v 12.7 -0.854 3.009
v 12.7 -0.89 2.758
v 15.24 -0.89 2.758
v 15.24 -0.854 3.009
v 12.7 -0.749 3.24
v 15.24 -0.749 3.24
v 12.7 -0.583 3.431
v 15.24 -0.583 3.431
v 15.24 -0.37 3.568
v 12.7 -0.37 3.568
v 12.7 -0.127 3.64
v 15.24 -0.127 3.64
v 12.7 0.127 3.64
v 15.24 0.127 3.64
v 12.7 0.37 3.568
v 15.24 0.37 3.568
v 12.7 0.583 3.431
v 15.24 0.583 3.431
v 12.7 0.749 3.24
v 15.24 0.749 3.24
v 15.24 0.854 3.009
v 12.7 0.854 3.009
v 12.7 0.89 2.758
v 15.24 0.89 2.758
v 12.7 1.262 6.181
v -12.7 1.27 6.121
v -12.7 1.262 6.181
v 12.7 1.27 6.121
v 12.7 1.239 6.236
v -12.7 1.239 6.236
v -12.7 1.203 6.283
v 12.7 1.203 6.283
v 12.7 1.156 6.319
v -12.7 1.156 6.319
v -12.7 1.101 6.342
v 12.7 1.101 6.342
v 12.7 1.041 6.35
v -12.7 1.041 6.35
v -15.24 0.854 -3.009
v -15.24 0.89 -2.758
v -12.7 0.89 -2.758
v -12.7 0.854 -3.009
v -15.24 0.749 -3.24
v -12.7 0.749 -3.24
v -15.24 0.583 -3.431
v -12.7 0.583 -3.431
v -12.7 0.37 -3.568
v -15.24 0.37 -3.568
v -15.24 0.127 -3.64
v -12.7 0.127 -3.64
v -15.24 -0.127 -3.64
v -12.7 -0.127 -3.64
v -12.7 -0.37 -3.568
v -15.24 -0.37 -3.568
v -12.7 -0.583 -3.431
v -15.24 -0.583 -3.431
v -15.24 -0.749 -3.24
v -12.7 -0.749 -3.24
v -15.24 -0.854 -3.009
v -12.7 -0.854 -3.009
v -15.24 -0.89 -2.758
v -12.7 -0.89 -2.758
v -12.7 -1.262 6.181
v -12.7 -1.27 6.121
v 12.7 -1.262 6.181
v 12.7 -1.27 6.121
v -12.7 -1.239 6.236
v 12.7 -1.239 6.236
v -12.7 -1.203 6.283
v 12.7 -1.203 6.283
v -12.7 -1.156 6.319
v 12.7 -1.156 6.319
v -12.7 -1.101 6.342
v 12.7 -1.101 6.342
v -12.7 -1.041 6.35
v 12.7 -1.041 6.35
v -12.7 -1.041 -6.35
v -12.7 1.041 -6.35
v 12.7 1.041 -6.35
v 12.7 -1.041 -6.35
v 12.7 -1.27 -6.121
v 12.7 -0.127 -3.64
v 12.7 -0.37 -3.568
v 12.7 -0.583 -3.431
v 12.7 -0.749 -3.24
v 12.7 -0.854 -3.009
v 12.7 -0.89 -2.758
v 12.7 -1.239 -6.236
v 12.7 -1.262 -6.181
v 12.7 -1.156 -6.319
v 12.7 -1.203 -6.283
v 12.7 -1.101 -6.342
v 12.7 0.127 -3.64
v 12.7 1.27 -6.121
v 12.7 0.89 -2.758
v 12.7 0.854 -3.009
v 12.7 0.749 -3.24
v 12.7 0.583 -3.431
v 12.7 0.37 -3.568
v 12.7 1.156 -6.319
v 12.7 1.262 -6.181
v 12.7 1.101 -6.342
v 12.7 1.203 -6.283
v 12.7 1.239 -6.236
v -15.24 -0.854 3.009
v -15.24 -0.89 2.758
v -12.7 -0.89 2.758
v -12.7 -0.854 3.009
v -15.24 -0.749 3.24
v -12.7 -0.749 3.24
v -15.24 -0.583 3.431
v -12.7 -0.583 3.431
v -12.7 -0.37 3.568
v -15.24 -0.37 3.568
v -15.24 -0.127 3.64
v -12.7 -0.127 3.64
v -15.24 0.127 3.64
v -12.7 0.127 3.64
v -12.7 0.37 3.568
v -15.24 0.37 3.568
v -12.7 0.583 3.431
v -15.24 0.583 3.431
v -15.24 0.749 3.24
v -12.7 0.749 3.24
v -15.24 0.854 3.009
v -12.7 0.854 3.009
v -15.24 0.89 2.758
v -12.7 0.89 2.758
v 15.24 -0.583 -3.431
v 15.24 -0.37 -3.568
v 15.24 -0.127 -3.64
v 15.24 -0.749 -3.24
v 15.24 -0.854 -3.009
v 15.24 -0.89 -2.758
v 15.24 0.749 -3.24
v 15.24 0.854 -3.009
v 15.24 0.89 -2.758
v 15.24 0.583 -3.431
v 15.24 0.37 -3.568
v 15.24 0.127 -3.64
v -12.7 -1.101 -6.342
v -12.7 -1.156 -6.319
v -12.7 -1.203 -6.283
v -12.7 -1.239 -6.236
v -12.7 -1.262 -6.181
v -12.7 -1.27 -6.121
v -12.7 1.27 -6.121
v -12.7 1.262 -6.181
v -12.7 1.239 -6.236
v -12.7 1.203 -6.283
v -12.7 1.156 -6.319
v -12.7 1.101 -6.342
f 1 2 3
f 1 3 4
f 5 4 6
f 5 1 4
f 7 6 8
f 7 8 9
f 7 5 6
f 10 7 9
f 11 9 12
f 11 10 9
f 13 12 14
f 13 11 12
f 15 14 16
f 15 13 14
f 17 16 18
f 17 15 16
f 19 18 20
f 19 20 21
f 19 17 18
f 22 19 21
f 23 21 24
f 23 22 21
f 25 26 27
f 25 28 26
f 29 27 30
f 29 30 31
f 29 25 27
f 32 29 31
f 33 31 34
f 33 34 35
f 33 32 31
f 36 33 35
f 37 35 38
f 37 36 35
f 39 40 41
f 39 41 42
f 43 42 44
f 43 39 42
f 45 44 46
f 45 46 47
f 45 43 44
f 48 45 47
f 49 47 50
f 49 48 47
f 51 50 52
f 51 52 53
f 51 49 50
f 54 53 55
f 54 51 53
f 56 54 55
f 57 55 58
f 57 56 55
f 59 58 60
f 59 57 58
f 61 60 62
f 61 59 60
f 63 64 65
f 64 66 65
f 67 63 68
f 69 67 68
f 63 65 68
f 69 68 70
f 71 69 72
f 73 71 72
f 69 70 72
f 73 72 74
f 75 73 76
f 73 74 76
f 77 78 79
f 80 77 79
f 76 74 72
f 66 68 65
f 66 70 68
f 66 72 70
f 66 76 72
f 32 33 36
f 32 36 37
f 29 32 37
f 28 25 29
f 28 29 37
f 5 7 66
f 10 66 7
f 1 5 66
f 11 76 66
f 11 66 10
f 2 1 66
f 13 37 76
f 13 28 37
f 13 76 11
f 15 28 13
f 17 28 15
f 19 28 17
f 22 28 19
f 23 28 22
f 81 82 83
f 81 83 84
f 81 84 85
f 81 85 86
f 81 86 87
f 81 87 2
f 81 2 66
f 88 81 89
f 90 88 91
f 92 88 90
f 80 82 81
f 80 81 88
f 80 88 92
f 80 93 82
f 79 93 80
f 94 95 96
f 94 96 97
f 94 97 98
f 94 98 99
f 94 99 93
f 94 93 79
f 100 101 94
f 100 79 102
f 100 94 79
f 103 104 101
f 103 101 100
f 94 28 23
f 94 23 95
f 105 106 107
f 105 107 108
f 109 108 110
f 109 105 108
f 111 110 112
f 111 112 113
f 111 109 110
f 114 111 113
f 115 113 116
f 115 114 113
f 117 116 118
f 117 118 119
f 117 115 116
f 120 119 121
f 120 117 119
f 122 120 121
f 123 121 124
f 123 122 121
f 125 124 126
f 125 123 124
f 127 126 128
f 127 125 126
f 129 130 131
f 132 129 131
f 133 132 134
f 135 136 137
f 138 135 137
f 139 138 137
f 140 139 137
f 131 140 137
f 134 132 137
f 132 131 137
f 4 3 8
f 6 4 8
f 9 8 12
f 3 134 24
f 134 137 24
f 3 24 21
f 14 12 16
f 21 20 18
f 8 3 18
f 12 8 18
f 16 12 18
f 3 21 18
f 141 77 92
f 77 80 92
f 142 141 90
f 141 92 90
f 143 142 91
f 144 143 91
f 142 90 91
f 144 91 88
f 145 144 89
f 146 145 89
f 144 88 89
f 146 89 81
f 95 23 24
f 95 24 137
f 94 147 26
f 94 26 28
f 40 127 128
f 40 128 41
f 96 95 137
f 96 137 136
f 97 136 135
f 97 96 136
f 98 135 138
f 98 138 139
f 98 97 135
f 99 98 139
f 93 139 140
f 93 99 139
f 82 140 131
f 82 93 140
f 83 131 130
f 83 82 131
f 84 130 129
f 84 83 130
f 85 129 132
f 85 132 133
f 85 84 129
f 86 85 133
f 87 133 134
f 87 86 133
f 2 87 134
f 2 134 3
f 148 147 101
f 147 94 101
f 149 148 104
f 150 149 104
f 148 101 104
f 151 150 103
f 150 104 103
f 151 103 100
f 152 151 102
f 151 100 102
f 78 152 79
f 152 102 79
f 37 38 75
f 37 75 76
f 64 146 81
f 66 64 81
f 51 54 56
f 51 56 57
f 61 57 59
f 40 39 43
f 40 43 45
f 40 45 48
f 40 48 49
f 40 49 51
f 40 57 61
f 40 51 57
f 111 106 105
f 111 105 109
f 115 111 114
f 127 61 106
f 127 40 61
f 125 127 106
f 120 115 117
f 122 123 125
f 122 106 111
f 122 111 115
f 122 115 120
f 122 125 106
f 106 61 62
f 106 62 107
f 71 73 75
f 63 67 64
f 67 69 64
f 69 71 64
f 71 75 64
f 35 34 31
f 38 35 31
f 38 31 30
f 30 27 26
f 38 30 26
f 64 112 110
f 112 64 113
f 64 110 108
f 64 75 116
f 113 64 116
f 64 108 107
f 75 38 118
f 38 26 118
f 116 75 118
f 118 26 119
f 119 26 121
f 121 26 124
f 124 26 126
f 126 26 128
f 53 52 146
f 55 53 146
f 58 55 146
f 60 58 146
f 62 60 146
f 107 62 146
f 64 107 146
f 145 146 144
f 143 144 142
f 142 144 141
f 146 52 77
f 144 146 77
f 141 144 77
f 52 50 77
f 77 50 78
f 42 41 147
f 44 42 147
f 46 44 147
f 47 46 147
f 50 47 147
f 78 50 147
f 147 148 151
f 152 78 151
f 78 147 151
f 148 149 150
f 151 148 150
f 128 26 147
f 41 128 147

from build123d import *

# Parameters (mm, degrees)
SKETCH1_W                = 25.4
SKETCH1_H                = 12.7
BOSS_EXTRUDE1_DEPTH      = 1.27
FILLET1_R                = 0.2286
BOSS_EXTRUDE2_DEPTH      = 15.24
BOSS_EXTRUDE2_DEPTH_BACK = 15.24


with BuildPart() as part:
    # Sketch1 → Boss-Extrude1 (new, symmetric)
    with BuildSketch(Plane(origin=(0, 0, 0), x_dir=(1, 0, 0), z_dir=(0, 1, 0))):
        Rectangle(SKETCH1_W, SKETCH1_H)
    extrude(amount=BOSS_EXTRUDE1_DEPTH, both=True)

    # Fillet1
    fillet1_edges = [part.edges().sort_by_distance(p)[0] for p in [
        (0, 1.27, 6.35),
        (0, -1.27, 6.35),
        (0, -1.27, -6.35),
        (0, 1.27, -6.35),
    ]]
    fillet(fillet1_edges, radius=FILLET1_R)

    # Sketch3 → Boss-Extrude2 (add, two sides: drawn at the far end of the back side and taken through both)
    with BuildSketch(Plane(origin=(0, 0, 0), x_dir=(0, 0, -1), z_dir=(1, 0, 0)).offset(-BOSS_EXTRUDE2_DEPTH_BACK)):
        with BuildLine():
            Line((-2.75846638, 0.890155409), (2.75846638, 0.890155409))
            ThreePointArc((2.75846638, 0.890155409), (3.648621789, 0), (2.75846638, -0.890155409))
            Line((2.75846638, -0.890155409), (-2.75846638, -0.890155409))
            ThreePointArc((-2.75846638, -0.890155409), (-3.648621789, 0), (-2.75846638, 0.890155409))
        make_face()
    extrude(amount=BOSS_EXTRUDE2_DEPTH + BOSS_EXTRUDE2_DEPTH_BACK)


solid = part.part
